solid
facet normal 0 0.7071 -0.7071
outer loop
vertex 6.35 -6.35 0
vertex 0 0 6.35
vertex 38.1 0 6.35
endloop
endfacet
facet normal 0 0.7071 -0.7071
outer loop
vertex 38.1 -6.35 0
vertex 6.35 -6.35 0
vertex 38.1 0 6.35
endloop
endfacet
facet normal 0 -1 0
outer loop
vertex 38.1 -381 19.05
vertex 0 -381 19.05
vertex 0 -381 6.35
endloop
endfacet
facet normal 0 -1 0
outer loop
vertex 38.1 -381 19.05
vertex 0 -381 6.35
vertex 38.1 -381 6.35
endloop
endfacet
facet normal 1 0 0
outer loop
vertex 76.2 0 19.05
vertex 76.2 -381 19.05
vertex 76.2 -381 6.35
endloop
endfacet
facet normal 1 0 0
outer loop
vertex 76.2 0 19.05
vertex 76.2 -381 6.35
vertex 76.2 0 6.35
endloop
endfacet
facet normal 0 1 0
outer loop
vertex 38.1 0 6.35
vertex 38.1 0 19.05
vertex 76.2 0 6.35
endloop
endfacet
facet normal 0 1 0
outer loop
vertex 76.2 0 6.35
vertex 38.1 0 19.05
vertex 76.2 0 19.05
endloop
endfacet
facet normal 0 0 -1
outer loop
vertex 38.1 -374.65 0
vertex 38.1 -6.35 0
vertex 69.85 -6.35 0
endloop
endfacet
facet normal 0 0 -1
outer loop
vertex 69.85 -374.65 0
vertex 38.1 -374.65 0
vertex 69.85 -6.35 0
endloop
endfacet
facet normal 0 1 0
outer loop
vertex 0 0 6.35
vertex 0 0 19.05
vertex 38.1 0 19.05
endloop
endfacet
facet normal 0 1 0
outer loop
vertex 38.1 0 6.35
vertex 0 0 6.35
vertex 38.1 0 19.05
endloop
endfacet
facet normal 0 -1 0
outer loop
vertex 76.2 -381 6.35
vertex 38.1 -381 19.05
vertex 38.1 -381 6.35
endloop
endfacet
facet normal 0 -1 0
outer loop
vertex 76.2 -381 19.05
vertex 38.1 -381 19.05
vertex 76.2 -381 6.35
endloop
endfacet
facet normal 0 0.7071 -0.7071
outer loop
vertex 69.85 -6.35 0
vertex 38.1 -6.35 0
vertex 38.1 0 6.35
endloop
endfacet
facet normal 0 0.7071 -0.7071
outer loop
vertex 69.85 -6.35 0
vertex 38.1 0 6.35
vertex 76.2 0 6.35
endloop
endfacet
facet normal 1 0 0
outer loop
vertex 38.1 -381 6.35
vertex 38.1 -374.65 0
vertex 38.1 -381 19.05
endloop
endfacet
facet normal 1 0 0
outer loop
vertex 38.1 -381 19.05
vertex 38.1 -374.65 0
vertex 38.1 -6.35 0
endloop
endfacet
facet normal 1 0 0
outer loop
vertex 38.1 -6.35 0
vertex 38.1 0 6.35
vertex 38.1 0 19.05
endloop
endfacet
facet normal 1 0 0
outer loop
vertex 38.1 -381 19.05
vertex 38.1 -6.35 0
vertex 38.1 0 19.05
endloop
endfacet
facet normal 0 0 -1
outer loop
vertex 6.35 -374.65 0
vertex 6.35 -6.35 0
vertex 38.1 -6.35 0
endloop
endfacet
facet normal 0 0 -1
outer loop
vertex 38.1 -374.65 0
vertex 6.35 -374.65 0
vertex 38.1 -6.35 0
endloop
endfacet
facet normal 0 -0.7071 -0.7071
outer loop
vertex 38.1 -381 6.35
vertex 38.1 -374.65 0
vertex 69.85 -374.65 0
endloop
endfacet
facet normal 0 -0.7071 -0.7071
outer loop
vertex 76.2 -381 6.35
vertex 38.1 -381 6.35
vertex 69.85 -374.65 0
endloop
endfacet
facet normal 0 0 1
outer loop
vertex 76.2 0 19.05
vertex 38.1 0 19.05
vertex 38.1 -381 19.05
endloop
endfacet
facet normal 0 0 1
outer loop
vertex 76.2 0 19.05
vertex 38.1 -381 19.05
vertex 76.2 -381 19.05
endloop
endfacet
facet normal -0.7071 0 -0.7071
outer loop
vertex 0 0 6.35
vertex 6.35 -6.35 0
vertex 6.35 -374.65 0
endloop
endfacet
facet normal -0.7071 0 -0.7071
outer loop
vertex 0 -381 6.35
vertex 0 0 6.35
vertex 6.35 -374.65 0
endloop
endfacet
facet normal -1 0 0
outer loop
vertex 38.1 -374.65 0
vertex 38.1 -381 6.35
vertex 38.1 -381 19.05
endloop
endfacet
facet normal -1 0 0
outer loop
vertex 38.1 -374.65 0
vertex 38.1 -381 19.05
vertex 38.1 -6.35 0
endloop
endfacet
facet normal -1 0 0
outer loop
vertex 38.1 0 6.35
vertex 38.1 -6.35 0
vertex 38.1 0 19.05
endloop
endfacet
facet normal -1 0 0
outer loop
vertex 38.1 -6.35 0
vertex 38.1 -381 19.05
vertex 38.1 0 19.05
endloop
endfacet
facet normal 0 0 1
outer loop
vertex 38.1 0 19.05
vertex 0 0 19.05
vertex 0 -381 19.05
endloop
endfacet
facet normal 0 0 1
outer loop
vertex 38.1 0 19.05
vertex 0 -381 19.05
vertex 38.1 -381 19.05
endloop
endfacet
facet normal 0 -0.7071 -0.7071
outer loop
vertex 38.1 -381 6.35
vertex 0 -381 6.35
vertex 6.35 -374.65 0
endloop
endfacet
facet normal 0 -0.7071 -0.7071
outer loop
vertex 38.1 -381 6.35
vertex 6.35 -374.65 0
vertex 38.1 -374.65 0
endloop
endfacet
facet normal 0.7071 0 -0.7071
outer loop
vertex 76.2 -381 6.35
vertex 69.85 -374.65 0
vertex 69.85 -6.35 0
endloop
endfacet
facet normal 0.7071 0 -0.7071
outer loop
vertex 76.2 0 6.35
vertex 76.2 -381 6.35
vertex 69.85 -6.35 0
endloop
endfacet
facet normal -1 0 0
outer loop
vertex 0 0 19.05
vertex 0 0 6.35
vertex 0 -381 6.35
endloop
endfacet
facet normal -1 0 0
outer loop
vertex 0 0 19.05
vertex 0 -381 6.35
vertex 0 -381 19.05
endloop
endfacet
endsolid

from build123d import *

# Parameters (mm, degrees)
F0_W      = 38.1
F0_H      = 19.05
F1_DEPTH  = 381
F2_W      = 38.1
F2_H      = 381
F3_DEPTH  = 19.05
F4_SIZE   = 6.35
F4_2_SIZE = 6.35


with BuildPart() as f1:
    # F0 (on Front) → F1 (new body)
    with BuildSketch(Plane.XZ):
        with Locations((19.05, 9.525)):
            Rectangle(F0_W, F0_H)
    extrude(amount=F1_DEPTH)

    # F4
    f4_edges = [f1.edges().sort_by_distance(p)[0] for p in [
        (0, -190.5, 0),
        (19.05, -381, 0),
        (19.05, 0, 0),
    ]]
    chamfer(f4_edges, length=F4_SIZE)


with BuildPart() as f3:
    # F2 (on face) → F3 (new body)
    with BuildSketch(Plane.XY.offset(19.05)):
        with Locations((57.15, -190.5)):
            Rectangle(F2_W, F2_H)
    extrude(amount=-F3_DEPTH)

    # F4#2
    f4_2_edges = [f3.edges().sort_by_distance(p)[0] for p in [
        (76.2, -190.5, 0),
        (57.15, -381, 0),
        (57.15, 0, 0),
    ]]
    chamfer(f4_2_edges, length=F4_2_SIZE)


solid = Compound([f1.part, f3.part])
